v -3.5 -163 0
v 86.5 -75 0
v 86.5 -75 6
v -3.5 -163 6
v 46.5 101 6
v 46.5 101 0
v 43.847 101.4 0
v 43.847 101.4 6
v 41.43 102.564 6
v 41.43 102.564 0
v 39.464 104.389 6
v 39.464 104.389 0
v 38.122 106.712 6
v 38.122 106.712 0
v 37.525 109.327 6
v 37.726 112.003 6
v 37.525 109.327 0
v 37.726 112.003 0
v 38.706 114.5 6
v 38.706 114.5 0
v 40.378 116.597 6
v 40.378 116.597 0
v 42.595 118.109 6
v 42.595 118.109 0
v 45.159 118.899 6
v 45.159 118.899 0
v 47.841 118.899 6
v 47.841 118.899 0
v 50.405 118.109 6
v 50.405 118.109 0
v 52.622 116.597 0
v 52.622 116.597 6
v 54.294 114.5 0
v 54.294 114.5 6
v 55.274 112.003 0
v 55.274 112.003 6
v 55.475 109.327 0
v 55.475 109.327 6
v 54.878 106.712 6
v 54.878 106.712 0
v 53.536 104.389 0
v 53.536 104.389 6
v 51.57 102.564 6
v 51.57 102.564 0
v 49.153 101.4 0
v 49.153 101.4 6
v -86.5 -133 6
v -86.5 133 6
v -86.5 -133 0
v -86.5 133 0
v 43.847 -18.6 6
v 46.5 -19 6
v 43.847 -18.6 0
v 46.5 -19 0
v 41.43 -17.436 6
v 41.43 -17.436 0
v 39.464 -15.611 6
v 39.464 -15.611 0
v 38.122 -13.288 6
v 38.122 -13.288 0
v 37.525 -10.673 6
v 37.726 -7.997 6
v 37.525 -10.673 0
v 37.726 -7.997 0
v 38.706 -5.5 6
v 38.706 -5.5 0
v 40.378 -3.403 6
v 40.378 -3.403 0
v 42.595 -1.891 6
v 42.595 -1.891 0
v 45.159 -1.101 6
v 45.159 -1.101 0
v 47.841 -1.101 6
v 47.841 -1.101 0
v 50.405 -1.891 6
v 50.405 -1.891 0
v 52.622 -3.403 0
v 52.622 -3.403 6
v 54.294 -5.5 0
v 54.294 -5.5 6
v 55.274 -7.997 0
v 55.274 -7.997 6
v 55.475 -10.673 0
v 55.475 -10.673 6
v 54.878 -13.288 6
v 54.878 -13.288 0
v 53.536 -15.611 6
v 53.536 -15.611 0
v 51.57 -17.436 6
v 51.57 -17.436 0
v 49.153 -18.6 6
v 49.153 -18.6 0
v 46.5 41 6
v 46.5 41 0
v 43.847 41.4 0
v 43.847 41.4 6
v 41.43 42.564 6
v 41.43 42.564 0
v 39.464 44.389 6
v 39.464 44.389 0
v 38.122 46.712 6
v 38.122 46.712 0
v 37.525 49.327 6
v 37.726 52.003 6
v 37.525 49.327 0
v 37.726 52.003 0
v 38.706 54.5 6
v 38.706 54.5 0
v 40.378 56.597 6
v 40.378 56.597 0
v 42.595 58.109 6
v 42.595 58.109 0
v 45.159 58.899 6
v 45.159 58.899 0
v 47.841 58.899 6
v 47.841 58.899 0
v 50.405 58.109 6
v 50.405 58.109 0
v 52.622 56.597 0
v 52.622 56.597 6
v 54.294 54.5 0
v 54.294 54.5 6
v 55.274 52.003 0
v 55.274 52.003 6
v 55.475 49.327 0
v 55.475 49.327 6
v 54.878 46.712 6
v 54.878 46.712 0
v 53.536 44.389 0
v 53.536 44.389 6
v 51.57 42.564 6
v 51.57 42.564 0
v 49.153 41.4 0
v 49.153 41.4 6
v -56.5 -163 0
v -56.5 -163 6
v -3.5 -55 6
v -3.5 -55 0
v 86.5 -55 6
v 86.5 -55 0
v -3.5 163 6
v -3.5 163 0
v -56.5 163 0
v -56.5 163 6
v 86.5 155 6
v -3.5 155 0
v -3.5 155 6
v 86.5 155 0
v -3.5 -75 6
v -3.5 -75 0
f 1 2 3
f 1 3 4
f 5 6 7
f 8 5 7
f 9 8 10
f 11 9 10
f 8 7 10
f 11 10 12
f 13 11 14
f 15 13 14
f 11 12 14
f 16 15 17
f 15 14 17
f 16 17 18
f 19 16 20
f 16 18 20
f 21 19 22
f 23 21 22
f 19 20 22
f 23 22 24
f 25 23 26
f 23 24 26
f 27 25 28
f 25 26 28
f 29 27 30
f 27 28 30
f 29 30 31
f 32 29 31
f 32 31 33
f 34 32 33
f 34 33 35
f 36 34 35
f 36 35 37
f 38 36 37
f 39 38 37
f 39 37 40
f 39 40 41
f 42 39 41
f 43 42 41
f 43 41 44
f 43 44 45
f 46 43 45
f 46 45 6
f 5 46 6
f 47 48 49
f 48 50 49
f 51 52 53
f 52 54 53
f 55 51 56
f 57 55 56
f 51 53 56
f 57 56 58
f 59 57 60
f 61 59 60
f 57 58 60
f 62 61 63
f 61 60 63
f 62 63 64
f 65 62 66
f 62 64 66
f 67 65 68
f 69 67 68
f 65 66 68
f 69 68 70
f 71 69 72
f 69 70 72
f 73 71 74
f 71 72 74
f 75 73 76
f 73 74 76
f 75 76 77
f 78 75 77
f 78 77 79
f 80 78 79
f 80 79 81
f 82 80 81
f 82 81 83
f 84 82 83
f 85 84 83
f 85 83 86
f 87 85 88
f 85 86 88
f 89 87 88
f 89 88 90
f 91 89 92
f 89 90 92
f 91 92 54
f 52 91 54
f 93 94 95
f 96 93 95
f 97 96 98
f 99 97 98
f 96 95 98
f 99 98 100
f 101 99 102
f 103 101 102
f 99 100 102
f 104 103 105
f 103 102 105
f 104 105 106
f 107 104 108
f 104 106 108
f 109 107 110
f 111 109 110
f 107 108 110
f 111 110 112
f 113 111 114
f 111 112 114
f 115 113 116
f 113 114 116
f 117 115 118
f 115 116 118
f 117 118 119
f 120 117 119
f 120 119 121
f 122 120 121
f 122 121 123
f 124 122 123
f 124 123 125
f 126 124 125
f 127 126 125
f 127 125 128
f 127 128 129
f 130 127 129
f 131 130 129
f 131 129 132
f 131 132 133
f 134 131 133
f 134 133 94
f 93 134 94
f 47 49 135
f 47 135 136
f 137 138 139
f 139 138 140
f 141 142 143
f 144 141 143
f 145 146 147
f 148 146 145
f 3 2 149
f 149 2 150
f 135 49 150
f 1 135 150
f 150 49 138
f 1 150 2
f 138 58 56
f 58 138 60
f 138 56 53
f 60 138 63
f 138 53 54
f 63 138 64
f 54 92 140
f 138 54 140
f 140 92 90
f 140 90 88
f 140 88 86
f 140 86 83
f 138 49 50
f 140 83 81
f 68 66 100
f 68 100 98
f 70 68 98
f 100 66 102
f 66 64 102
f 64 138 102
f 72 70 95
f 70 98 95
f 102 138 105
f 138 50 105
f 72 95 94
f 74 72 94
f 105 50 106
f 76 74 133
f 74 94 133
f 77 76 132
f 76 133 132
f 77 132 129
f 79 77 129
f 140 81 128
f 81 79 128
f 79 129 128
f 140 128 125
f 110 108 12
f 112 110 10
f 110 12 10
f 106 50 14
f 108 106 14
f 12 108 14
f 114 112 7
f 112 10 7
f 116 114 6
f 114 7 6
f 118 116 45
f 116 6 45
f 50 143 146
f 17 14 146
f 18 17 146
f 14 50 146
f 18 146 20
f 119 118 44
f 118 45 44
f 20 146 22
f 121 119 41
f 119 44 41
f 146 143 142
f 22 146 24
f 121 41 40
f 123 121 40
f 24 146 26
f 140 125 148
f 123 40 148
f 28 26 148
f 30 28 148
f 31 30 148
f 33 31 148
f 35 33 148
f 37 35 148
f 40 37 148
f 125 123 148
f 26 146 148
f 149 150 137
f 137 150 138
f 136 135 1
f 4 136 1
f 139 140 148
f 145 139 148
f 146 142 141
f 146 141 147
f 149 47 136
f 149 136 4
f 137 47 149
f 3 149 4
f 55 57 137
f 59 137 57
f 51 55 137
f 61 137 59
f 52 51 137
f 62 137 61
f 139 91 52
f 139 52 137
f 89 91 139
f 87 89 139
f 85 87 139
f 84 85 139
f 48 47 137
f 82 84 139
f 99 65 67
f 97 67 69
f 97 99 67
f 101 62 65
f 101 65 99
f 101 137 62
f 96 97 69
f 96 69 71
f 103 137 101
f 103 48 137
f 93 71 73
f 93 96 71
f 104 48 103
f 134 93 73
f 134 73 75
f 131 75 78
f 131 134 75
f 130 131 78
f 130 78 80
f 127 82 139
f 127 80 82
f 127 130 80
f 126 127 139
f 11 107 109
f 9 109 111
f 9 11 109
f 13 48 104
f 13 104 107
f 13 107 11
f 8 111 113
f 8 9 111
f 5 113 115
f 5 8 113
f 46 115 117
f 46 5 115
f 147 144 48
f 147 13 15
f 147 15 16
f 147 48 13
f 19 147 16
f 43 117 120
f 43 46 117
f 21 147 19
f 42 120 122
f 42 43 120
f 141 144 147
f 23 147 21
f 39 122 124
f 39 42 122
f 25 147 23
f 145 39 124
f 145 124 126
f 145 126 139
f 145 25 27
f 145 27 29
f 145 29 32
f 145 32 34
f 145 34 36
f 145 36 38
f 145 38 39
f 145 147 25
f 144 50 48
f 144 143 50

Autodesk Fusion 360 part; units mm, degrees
sketch "スケッチ1" plane through (0, 0, 0) normal (0, 0, 1) x (1, 0, 0)
  line L0 (-3.5, 163) -> (-86.5, 163)
  line L1 (-86.5, 163) -> (-86.5, -163)
  line L2 (-86.5, -163) -> (-3.5, -163)
  line L3 (86.5, -55) -> (86.5, 155)
  line L4 (82.2546, 155) -> (-86.5, -163) construction
  line L5 (-3.5, 163) -> (-3.5, 155)
  line L6 (-3.5, 155) -> (86.5, 155)
  line L7 (-86.5, -163) -> (-3.5, -163) construction
  line L8 (86.5, -75) -> (-3.5, -163)
  line L9 (86.5, -75) -> (-3.5, -75)
  line L10 (-3.5, -75) -> (-3.5, -55)
  line L11 (-3.5, -55) -> (86.5, -55)
  line L12 (-86.5, 163) -> (29.1871, -55) construction
  line L13 (39.8006, -75) -> (55.7541, -105.0627) construction
  dimension "d2" = 326
  dimension "d5" = 83
  dimension "d7" = 90
  dimension "d8" = 20
extrude "押し出し1" add sketch "スケッチ1" along normal blind 6
chamfer "面取り1" distance 30 angle 45 2 edges at (-86.5, -163, 3) (-86.5, 163, 3)
sketch "スケッチ2" plane through (0, 0, 6) normal (0, 0, 1) x (-1, 0, 0)
  line L0 (56.5, -163) -> (86.5, -133)
  line L1 (86.5, -133) -> (86.5, 133)
  line L2 (86.5, 133) -> (56.5, 163)
  line L3 (56.5, 163) -> (3.5, 163)
  line L4 (3.5, 163) -> (-86.5, 75)
  line L5 (-86.5, 75) -> (3.5, 75)
  line L6 (3.5, 75) -> (3.5, 55)
  line L7 (3.5, 55) -> (-86.5, 55)
  line L8 (-86.5, 55) -> (-86.5, -155)
  line L9 (-86.5, -155) -> (3.5, -155)
  line L10 (3.5, -155) -> (3.5, -163)
  line L11 (3.5, -163) -> (56.5, -163)
  line L12 (-86.5, -155) -> (-46.5, -155) construction
  line L13 (-46.5, -155) -> (-46.5, -110) construction
  line L14 (-46.5, -110) -> (-86.5, -110) construction
  line L15 (-86.5, -110) -> (-86.5, -155) construction
  line L16 (-46.5, -110) -> (-46.5, -50) construction
  line L17 (-46.5, -50) -> (-46.5, 10) construction
  point P0 (-46.5, -110)
  point P1 (-46.5, -50)
  dimension "d12" = 40
  dimension "d13" = 45
  dimension "d14" = 60
  dimension "d15" = 60
hole "穴1" at (46.5, 110, 6) at (46.5, 50, 6) at (46.5, -10, 6) direction (0, 0, -1) diameter 18 end through all
equation "d5 = 30 mm + 53 mm"
